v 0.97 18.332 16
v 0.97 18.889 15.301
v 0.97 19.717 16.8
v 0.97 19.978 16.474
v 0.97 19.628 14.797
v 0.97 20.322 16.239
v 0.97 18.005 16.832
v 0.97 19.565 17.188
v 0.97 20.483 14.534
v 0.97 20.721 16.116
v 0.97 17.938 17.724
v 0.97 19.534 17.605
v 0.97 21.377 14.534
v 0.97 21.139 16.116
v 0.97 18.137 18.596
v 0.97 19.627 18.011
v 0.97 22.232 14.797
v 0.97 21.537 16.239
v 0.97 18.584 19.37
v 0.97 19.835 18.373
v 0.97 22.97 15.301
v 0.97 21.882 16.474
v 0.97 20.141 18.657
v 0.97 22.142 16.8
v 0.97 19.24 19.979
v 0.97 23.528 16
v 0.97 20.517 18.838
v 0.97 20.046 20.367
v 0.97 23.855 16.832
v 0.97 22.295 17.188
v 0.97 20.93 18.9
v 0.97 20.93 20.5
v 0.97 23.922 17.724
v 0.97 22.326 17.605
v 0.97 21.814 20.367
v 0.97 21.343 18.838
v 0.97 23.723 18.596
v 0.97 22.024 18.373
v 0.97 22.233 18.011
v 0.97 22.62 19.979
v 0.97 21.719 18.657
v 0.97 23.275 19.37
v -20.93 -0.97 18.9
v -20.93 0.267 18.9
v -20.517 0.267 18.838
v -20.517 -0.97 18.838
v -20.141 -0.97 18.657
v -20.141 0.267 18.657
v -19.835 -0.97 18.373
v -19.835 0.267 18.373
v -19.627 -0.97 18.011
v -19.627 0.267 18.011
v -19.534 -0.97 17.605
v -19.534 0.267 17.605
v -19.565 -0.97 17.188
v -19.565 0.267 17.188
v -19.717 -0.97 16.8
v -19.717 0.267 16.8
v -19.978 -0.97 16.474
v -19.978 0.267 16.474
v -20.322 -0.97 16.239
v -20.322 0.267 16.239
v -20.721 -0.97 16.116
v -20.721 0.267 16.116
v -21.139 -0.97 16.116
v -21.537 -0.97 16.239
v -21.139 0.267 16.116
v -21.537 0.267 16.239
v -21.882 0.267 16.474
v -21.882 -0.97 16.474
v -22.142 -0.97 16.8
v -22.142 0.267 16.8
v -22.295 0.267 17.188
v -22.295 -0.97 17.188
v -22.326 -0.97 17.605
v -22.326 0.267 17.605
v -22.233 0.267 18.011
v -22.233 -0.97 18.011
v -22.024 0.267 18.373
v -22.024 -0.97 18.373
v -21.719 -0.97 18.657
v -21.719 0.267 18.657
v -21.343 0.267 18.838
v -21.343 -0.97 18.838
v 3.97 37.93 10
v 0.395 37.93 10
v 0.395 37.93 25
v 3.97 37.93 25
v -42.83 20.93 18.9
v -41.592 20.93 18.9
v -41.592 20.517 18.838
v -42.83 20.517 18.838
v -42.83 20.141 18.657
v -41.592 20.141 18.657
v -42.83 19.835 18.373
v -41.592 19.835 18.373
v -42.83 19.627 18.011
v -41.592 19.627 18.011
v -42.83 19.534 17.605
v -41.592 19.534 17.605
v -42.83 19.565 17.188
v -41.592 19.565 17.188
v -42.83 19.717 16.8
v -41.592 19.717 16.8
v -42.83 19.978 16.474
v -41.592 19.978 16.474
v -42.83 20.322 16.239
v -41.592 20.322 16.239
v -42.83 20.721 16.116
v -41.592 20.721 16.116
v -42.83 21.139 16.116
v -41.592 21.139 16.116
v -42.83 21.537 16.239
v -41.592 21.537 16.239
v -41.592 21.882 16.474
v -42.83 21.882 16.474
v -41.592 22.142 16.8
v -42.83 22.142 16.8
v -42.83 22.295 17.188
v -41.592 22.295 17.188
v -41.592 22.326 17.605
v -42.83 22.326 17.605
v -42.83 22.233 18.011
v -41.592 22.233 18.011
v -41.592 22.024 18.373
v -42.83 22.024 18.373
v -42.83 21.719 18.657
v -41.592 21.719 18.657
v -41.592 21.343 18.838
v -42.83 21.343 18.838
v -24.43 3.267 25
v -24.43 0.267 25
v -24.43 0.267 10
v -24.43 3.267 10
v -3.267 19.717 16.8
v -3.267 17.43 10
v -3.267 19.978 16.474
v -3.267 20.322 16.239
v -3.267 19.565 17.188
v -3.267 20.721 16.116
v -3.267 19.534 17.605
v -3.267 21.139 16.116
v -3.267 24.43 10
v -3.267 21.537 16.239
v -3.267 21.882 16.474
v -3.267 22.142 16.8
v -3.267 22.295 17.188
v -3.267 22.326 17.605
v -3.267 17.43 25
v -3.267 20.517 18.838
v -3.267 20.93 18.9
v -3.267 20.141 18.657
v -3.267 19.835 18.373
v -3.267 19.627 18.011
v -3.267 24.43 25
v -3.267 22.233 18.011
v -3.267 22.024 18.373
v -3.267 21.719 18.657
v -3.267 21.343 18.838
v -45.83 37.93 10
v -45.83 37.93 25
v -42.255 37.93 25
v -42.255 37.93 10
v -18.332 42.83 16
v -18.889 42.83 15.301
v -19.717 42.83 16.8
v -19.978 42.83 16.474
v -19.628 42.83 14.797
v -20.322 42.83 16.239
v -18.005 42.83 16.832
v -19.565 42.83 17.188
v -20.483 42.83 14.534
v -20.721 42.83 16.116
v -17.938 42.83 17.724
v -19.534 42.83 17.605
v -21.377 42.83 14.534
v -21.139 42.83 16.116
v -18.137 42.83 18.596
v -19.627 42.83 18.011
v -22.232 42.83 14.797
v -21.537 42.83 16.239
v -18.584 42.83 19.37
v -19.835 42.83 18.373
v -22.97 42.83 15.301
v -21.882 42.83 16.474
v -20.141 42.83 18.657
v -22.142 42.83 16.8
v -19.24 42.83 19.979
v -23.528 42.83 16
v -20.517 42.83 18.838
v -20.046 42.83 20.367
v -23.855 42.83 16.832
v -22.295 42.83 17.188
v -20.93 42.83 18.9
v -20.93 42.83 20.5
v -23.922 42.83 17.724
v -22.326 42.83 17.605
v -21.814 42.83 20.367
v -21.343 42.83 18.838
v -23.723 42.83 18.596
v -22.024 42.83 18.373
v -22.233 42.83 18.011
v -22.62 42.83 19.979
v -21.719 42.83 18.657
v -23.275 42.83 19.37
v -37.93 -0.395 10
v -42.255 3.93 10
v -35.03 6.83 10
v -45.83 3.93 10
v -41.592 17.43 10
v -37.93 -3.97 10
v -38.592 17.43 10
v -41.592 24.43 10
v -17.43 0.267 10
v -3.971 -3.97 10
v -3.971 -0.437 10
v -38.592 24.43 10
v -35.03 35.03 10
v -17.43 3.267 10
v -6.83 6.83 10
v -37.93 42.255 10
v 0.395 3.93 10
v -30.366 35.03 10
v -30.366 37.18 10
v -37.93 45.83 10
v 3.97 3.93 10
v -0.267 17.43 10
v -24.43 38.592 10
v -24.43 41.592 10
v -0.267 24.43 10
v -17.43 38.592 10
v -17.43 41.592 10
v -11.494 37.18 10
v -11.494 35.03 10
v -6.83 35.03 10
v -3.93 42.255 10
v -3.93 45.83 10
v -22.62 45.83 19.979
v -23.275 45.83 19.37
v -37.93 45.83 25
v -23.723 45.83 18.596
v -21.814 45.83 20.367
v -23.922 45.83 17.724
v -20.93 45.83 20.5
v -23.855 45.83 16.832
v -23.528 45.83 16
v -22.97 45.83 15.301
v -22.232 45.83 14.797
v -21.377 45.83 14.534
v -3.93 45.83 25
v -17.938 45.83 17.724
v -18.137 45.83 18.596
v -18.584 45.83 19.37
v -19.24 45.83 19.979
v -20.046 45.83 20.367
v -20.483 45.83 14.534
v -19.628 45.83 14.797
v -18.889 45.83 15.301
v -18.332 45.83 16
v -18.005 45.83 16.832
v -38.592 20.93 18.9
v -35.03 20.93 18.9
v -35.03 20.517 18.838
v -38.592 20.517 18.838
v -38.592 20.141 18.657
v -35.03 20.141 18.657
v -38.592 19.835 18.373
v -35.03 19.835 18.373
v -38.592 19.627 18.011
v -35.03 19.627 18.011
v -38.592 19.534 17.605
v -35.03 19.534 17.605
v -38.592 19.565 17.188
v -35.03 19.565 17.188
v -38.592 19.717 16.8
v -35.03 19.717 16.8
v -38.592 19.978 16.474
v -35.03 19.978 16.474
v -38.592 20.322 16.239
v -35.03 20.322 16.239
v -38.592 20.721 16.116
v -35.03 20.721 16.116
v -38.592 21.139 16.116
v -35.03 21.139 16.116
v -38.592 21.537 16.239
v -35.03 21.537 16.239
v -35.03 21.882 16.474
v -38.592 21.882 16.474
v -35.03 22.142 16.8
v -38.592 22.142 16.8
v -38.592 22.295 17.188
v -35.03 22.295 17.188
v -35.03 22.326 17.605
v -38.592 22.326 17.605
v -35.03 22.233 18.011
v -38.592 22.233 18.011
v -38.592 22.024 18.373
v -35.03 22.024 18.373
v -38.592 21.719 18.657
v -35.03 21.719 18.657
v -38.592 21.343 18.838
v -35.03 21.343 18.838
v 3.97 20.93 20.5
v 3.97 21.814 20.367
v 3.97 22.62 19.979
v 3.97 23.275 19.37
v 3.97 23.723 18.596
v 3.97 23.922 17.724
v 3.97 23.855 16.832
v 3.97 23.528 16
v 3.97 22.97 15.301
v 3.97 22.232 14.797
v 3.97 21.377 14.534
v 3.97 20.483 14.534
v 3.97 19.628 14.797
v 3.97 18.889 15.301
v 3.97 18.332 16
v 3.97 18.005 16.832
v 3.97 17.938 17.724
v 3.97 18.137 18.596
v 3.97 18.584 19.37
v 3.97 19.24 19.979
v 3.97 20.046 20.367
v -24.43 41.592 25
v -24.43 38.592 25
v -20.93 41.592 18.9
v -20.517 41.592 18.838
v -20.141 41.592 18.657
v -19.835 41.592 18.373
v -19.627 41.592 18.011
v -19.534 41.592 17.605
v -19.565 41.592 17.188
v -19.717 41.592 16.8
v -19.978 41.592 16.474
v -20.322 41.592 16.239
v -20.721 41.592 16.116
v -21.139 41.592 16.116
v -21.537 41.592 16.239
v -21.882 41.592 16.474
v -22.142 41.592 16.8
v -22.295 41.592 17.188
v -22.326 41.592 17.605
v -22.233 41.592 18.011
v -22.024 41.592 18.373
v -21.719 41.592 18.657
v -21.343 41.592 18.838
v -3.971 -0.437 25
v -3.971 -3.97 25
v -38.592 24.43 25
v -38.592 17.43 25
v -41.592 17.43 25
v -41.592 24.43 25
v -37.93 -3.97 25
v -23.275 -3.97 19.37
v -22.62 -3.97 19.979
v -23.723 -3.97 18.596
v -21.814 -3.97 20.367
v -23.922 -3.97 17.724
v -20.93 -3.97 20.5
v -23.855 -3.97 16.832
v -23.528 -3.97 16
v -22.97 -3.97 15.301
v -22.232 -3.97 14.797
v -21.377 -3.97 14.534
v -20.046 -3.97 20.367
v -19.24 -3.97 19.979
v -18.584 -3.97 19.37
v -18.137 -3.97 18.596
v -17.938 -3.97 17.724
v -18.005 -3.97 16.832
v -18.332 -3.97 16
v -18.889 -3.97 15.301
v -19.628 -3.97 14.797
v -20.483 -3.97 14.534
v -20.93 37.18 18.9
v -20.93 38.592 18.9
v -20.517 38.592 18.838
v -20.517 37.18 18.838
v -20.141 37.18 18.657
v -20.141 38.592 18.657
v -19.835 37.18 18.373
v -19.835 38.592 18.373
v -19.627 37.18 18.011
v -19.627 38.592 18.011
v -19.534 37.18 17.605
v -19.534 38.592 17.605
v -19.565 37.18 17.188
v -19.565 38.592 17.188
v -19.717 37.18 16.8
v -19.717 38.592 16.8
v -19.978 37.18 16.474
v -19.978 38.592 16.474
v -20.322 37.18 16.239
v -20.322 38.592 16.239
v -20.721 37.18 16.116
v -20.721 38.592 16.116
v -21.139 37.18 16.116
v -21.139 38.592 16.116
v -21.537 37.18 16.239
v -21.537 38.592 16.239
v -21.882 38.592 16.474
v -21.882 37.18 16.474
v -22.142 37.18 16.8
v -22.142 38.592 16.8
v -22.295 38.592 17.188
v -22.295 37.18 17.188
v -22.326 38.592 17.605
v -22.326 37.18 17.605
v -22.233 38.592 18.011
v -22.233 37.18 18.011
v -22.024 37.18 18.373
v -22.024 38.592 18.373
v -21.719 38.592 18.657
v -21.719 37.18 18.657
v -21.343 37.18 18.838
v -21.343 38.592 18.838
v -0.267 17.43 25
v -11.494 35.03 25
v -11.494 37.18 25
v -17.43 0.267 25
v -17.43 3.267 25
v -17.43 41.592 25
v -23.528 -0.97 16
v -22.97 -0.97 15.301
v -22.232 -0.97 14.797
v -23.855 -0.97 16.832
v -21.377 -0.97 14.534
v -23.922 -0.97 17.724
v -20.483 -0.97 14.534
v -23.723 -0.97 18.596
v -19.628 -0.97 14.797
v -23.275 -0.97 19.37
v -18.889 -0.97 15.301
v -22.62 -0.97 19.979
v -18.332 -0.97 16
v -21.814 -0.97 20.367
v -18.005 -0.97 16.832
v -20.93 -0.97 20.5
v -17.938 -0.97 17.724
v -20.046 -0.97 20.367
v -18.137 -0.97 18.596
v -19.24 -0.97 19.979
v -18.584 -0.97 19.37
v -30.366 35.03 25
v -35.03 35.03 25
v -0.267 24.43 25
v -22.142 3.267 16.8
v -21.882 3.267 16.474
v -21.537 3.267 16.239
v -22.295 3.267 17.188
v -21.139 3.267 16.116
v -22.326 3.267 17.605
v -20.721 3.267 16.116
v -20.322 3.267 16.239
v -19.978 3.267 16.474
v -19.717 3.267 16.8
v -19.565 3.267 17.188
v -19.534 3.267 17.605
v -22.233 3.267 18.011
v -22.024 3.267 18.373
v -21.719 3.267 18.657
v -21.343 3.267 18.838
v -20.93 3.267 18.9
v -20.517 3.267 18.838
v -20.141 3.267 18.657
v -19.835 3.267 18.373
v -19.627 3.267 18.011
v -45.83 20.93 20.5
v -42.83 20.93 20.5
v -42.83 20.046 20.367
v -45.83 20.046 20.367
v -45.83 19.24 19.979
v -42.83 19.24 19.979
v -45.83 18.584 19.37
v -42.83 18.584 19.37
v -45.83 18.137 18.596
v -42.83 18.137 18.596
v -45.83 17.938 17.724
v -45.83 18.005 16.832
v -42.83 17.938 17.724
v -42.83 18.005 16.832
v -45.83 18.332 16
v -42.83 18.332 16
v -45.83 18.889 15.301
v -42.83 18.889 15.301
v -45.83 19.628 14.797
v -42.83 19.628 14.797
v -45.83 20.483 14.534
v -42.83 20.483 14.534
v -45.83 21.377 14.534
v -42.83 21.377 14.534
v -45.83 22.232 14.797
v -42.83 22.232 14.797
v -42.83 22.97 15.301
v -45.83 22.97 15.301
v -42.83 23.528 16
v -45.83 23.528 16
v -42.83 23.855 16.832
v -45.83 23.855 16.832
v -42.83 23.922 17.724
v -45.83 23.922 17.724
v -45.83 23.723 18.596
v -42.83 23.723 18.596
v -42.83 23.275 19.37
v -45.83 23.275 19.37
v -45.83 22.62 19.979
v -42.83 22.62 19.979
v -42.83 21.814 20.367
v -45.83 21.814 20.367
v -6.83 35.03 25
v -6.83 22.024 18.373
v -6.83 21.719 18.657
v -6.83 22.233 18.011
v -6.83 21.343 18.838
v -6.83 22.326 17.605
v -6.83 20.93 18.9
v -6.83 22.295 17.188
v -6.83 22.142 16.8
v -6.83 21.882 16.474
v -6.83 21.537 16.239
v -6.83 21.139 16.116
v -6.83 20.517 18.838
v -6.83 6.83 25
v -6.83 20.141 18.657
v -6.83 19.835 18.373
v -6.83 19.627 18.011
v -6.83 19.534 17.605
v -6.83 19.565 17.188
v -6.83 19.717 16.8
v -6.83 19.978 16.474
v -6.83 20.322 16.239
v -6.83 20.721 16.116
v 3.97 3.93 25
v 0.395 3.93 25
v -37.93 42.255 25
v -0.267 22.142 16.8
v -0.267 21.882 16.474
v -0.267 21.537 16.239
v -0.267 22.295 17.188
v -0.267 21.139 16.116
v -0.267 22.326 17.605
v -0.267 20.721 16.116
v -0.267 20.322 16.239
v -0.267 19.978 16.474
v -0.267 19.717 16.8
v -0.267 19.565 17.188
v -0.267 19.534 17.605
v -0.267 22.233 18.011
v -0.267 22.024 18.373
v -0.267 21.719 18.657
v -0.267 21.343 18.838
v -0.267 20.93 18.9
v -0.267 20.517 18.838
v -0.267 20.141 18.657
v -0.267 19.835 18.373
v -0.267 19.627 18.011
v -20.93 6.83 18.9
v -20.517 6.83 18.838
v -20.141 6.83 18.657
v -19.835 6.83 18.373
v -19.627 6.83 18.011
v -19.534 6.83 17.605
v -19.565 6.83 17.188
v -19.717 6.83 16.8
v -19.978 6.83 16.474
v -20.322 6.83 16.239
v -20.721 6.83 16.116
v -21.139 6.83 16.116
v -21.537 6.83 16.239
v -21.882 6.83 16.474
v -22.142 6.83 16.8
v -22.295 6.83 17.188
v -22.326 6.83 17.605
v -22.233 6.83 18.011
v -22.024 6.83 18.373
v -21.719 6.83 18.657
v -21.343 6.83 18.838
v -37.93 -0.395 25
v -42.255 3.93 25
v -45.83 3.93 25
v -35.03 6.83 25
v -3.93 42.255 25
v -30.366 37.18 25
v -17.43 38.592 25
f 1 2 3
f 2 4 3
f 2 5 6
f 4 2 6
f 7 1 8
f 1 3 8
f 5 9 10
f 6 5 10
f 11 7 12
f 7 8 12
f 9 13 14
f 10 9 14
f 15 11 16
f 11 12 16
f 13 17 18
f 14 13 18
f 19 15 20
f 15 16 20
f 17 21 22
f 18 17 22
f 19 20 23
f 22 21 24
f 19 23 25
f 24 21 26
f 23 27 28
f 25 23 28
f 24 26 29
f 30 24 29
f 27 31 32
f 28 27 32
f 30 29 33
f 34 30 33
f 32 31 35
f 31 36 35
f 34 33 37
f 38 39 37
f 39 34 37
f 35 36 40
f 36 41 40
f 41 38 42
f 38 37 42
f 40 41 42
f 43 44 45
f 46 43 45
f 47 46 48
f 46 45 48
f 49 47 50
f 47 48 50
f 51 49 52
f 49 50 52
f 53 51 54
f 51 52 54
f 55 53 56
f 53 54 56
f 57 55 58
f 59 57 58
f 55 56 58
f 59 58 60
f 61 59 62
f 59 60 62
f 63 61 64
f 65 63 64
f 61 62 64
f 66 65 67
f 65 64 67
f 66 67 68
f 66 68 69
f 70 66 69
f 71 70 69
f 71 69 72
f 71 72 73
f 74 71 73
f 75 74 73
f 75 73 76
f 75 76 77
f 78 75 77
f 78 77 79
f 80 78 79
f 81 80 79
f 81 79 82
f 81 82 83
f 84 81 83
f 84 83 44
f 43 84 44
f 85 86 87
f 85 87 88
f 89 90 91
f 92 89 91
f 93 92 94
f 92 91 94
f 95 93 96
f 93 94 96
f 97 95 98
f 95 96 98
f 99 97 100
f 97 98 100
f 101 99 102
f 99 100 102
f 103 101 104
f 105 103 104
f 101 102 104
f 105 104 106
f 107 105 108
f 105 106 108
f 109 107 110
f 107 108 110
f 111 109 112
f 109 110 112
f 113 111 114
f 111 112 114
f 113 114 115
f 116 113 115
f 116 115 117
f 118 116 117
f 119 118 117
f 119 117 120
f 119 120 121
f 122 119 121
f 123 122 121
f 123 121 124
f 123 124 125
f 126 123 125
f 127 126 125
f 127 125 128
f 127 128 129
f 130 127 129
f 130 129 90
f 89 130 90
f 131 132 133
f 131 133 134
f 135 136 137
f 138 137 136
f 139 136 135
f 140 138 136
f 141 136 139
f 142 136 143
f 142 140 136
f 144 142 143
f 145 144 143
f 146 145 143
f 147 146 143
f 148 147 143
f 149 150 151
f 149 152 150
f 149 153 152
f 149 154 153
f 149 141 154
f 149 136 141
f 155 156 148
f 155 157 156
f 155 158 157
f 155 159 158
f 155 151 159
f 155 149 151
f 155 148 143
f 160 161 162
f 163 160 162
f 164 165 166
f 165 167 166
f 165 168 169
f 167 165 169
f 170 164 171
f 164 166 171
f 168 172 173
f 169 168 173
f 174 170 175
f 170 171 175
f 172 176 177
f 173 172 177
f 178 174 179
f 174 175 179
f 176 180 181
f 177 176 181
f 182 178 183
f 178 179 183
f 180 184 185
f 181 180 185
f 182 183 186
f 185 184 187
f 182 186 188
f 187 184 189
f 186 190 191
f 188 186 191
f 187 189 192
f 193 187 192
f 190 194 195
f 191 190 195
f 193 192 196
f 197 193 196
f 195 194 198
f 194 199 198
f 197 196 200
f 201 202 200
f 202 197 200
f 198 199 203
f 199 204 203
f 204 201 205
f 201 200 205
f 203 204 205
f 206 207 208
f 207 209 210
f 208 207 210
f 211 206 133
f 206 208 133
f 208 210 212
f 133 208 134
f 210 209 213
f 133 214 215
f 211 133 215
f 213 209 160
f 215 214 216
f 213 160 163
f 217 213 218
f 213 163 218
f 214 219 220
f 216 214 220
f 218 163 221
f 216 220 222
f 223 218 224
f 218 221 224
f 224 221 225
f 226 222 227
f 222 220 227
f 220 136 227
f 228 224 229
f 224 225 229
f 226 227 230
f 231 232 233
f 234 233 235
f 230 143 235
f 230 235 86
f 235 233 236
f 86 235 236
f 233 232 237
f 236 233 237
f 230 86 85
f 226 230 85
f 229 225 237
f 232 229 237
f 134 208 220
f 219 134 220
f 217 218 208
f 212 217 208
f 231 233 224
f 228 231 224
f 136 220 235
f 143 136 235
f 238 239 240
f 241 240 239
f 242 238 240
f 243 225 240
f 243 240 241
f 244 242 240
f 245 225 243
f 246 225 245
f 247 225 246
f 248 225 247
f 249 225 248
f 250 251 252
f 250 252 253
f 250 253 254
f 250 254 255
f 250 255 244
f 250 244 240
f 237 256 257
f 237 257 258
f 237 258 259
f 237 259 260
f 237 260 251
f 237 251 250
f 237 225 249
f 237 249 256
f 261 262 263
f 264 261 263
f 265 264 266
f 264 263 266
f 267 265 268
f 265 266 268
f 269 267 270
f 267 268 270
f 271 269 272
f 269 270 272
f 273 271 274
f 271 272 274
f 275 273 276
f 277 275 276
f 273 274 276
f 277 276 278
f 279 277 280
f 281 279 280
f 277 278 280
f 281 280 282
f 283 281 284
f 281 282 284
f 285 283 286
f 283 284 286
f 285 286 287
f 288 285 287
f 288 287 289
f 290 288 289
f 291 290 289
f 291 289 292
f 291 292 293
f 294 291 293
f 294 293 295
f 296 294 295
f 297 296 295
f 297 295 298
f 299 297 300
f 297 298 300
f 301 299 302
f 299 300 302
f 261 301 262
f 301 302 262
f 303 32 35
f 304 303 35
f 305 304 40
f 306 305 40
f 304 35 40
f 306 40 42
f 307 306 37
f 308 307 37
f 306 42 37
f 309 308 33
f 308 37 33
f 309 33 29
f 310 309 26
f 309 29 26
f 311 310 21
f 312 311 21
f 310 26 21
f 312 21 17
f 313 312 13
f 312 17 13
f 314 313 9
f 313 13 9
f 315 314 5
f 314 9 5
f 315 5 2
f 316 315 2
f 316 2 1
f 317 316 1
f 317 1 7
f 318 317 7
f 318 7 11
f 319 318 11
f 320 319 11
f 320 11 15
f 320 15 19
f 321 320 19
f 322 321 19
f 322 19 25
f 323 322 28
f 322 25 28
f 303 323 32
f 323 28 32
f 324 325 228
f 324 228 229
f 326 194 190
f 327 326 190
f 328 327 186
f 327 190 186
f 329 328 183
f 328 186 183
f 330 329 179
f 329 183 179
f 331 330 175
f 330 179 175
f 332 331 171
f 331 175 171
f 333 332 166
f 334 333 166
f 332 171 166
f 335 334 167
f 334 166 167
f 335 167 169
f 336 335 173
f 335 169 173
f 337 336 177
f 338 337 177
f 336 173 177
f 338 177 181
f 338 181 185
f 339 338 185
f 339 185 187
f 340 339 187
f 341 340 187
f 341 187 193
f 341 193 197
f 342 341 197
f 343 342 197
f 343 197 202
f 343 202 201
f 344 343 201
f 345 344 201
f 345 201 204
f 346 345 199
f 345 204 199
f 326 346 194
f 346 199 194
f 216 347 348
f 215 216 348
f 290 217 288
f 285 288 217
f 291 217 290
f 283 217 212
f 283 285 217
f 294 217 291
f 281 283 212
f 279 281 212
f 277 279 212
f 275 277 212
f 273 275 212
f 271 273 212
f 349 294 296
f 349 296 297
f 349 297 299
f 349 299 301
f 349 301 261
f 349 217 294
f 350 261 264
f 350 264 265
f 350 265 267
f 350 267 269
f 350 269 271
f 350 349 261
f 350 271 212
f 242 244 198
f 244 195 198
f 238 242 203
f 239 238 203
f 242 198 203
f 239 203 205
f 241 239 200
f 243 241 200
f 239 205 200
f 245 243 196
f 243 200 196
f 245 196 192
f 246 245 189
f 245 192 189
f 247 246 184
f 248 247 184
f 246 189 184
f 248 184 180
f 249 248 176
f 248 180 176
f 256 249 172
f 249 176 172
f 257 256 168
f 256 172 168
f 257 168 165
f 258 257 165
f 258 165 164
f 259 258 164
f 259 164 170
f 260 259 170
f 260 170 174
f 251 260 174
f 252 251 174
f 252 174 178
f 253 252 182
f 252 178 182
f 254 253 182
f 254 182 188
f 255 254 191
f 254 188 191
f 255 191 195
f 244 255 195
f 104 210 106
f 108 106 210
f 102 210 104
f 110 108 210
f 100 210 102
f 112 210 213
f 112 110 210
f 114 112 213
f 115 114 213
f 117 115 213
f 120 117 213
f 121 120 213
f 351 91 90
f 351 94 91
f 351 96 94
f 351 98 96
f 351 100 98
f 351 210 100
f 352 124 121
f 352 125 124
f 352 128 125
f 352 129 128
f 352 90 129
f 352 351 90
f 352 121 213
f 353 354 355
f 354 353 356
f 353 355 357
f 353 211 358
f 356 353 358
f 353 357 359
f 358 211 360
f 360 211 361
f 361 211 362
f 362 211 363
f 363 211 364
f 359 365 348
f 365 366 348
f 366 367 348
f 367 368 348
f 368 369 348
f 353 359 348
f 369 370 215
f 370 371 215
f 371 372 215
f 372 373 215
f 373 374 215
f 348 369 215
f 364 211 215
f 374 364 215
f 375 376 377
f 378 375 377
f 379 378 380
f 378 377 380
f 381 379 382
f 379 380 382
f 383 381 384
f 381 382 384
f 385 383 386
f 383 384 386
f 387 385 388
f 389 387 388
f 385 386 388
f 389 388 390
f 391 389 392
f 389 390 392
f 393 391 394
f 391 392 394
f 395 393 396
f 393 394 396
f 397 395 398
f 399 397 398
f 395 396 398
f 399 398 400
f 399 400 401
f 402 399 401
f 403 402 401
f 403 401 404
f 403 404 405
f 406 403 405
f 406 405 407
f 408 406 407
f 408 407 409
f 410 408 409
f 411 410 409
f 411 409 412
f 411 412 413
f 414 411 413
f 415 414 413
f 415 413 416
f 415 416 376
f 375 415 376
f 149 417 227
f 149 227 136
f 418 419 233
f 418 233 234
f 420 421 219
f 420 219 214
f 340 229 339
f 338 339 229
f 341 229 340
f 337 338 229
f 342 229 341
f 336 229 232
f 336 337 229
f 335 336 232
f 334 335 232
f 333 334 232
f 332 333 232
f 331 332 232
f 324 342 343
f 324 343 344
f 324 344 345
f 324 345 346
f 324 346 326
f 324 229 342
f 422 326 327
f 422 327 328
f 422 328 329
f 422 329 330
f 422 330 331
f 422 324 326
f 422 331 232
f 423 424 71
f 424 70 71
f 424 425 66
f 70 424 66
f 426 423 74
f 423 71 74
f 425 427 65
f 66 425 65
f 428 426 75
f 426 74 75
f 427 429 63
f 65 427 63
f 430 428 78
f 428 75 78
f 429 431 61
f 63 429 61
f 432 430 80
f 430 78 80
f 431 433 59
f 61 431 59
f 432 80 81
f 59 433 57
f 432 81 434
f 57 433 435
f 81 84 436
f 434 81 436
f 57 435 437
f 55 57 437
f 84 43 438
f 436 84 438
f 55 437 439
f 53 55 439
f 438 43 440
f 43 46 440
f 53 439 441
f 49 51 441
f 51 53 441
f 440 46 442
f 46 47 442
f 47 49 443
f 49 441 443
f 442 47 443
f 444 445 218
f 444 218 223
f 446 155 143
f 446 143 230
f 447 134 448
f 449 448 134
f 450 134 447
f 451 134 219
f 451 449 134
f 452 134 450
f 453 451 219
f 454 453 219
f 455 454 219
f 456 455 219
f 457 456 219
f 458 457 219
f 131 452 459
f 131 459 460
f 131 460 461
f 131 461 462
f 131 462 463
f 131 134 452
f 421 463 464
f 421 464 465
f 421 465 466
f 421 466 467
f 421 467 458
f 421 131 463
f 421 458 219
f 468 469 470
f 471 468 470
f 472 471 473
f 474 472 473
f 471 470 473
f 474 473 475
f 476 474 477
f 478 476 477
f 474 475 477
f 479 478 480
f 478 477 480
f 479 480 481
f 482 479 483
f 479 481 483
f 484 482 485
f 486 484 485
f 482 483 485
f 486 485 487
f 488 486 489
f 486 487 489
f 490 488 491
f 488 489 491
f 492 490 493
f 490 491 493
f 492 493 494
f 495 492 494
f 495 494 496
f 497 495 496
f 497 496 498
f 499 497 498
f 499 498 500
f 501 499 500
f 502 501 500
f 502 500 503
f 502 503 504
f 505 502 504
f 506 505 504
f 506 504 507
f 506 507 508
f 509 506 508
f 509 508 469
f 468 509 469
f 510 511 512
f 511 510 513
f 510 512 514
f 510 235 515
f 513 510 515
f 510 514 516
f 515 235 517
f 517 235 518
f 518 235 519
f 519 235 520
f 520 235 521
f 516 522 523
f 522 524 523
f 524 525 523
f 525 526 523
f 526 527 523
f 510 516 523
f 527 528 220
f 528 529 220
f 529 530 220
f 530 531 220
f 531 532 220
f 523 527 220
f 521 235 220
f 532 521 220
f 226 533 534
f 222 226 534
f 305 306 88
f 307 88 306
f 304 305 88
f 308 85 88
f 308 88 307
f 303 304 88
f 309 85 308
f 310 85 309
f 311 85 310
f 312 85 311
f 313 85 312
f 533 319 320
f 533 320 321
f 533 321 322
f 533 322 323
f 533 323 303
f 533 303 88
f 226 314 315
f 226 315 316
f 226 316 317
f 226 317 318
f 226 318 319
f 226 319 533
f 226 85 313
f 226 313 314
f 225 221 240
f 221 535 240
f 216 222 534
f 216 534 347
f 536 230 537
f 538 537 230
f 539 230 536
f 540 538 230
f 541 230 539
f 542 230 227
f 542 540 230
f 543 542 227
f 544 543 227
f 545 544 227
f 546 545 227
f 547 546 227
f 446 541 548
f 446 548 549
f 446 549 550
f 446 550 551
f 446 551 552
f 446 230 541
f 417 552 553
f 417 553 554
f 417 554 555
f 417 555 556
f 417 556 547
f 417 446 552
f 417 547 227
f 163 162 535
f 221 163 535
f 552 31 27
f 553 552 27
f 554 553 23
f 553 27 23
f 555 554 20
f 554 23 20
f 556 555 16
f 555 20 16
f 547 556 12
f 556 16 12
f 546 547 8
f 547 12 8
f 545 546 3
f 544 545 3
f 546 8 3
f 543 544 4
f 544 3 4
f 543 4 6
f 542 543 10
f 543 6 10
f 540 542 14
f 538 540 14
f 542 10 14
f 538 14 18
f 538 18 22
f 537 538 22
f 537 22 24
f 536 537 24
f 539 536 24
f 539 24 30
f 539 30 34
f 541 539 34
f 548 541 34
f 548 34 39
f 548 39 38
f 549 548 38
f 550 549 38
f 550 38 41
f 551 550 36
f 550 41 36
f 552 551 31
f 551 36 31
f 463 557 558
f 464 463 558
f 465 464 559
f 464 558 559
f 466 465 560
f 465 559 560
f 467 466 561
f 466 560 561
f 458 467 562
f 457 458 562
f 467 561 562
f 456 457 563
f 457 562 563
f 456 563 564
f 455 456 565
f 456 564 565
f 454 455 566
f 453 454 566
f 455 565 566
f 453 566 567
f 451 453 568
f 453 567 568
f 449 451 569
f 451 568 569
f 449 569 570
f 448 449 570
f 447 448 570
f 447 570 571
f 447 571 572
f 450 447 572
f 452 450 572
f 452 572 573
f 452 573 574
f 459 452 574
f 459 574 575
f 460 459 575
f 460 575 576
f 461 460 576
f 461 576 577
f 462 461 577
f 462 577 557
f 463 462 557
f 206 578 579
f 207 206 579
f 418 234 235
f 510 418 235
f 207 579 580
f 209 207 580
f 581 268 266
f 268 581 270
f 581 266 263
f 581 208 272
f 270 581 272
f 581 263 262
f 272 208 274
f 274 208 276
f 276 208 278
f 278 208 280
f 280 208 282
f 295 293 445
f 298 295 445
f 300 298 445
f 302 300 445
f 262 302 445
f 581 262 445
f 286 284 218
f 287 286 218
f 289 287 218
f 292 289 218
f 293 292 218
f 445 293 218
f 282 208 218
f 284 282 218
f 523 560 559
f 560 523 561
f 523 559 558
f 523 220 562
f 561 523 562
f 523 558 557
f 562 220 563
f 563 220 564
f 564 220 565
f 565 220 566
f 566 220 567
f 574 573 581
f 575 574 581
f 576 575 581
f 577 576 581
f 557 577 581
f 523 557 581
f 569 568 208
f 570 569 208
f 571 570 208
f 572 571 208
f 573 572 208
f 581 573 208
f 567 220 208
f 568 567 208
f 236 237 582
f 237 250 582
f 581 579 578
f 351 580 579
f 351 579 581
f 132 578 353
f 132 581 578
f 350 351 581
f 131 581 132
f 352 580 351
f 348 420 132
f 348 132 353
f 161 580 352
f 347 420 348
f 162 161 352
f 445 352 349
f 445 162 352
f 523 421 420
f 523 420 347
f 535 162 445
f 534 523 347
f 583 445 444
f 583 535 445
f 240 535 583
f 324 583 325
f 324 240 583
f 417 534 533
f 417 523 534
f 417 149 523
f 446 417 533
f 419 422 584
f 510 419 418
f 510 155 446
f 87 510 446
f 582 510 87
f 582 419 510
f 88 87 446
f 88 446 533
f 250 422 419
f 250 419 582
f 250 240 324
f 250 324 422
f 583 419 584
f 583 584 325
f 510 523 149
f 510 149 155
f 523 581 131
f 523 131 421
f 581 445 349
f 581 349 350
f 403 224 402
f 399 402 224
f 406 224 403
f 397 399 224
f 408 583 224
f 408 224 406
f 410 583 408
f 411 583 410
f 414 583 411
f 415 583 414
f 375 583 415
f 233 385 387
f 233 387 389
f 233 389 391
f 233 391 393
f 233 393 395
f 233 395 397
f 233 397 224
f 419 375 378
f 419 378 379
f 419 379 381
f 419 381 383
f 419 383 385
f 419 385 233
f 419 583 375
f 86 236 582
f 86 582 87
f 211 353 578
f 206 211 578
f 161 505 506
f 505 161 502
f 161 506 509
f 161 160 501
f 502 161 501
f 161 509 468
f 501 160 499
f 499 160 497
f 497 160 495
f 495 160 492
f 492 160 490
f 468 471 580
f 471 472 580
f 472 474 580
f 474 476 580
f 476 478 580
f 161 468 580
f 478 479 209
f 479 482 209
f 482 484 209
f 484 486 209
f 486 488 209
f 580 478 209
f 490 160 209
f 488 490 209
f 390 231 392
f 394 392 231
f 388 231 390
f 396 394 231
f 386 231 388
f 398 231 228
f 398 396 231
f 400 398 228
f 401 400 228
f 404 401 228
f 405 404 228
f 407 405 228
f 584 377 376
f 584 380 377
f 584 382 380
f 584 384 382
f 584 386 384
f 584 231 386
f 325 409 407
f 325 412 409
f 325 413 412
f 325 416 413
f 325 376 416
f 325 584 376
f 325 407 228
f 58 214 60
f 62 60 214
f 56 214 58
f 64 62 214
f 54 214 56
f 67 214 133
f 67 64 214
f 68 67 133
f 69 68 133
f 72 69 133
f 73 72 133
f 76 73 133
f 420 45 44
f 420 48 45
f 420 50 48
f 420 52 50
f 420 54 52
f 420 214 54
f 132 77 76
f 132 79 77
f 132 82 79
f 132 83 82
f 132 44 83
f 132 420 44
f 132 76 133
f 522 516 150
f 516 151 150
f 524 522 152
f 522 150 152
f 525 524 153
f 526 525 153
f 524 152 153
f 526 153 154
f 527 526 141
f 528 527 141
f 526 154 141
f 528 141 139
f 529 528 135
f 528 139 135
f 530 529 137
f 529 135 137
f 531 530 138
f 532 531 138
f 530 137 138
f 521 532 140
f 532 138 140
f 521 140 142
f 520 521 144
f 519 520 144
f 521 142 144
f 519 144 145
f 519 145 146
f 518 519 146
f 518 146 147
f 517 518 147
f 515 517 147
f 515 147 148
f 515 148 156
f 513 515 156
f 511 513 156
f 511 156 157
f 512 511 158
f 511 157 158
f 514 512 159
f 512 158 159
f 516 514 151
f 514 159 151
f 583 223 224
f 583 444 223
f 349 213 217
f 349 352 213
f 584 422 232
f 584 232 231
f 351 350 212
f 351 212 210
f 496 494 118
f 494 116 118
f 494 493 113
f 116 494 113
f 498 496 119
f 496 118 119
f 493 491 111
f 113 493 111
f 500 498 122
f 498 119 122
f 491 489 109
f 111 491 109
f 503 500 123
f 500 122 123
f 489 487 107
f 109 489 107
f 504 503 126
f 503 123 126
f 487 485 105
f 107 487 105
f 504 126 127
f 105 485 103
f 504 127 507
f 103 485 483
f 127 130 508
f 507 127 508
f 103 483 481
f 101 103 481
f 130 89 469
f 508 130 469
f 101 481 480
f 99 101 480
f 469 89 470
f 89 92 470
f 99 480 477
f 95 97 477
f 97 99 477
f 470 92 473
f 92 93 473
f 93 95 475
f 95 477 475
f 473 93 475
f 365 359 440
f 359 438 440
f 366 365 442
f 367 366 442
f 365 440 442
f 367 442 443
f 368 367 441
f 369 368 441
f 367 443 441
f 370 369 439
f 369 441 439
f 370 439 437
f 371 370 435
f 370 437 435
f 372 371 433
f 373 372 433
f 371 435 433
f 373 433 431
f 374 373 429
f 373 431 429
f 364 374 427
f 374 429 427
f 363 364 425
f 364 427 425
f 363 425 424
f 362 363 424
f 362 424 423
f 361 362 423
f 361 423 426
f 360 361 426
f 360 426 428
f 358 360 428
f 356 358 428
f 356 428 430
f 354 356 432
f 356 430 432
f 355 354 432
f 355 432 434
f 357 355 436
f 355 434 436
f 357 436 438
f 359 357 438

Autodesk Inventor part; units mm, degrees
ref_plane "YZ Plane" through (0, 0, 0) normal (1, 0, 0) x (0, 1, 0)
ref_plane "XZ Plane" through (0, 0, 0) normal (0, 1, 0) x (-1, 0, 0)
ref_plane "XY Plane" through (0, 0, 0) normal (0, 0, 1) x (1, 0, 0)
ref_plane "Work Plane5" through (0, 0, 10) normal (0, 0, 1) x (1, 0, 0)
sketch "Sketch1" plane through (0, 0, 10) normal (0, 0, 1) x (1, 0, 0)
  line L0 (-4.0299, -0.3538) -> (-2.2322, 1.4439) construction
  arc A0 (-1.4439, 2.2322) -> (-2.2322, 1.4439) centre (-0.9299, 0.9299) ccw construction
  line L1 (-1.4439, 2.2322) -> (0.3538, 4.0299) construction
  line L2 (-37.8299, 42.8299) -> (-37.8299, 37.8299) construction
  line L3 (-37.8299, 37.8299) -> (-42.9208, 37.8299) construction
  line L4 (-37.8299, 42.2137) -> (-37.8299, 45.8299) construction
  line L5 (-37.8299, 45.8299) -> (-4.0299, 45.8299) construction
  line L6 (-4.0299, 45.8299) -> (-4.0299, 42.2137) construction
  line L7 (-4.0299, 4.0299) -> (0.3538, 4.0299) projected
  circle A1 centre (-20.9299, 20.9299) radius 17.5 projected
  line L8 (-20.9299, 58.9723) -> (17.1124, 20.9299) construction
  line L9 (17.1124, 20.9299) -> (-20.9299, -17.1124) construction
  line L10 (-20.9299, -17.1124) -> (-58.9723, 20.9299) construction
  line L11 (-58.9723, 20.9299) -> (-20.9299, 58.9723) construction
  line L12 (-20.9299, 58.9723) -> (-20.9299, -17.1124) construction
  line L13 (17.1124, 20.9299) -> (-58.9723, 20.9299) construction
  line L14 (-20.9299, 58.9723) -> (32.8701, 58.9723) construction
  line L15 (-43.4299, 43.4299) -> (1.5701, 43.4299) construction
  line L16 (1.5701, 43.4299) -> (1.5701, -1.5701) construction
  line L17 (1.5701, -1.5701) -> (-43.4299, -1.5701) construction
  line L18 (-43.4299, -1.5701) -> (-43.4299, 43.4299) construction
  line L19 (-43.4299, 43.4299) -> (1.5701, -1.5701) construction
  line L20 (1.5701, 43.4299) -> (-43.4299, -1.5701) construction
  line L21 (-43.4299, 5.3876) -> (-43.4299, 36.4723)
  line L22 (-43.4299, 36.4723) -> (-36.4723, 43.4299)
  line L23 (-36.4723, 43.4299) -> (-5.3876, 43.4299)
  line L24 (-5.3876, 43.4299) -> (1.5701, 36.4723)
  line L25 (1.5701, 36.4723) -> (1.5701, 5.3876)
  line L26 (1.5701, 5.3876) -> (-5.3876, -1.5701)
  line L27 (-5.3876, -1.5701) -> (-36.4723, -1.5701)
  line L28 (-36.4723, -1.5701) -> (-43.4299, 5.3876)
  line L29 (-4.0299, 42.2137) -> (-37.8299, 42.2137) projected
  line L30 (-4.0299, -0.3538) -> (-4.0299, 4.0299) projected
  circle A2 centre (-20.9299, 20.9299) radius 1.5
  line L31 (-10.9299, 10.9299) -> (-30.9299, 10.9299) construction
  line L32 (-30.9299, 10.9299) -> (-30.9299, 30.9299) construction
  line L33 (-30.9299, 30.9299) -> (-10.9299, 30.9299) construction
  line L34 (-10.9299, 30.9299) -> (-10.9299, 10.9299) construction
  line L35 (-10.9299, 10.9299) -> (-30.9299, 30.9299) construction
  line L36 (-30.9299, 10.9299) -> (-10.9299, 30.9299) construction
  circle A3 centre (-30.9299, 30.9299) radius 1.4
  circle A4 centre (-30.9299, 10.9299) radius 1.4
  circle A5 centre (-10.9299, 10.9299) radius 1.4
  line L37 (-45.8299, 37.8299) -> (-42.0723, 37.8299) construction
  line L38 (-42.1723, 37.7299) -> (-45.8299, 37.7299)
  line L39 (-45.8299, 37.7299) -> (-45.8299, 4.1299)
  line L40 (-45.8299, 4.1299) -> (-42.1723, 4.1299)
  line L41 (-42.1723, 4.1299) -> (-42.1723, 37.7299)
  line L42 (-45.8299, 4.0299) -> (-42.0723, 4.0299) construction
  line L43 (-45.8299, 37.8299) -> (-42.0723, 37.8299) projected
  line L44 (-37.7299, 45.8299) -> (-4.1299, 45.8299)
  line L45 (-4.1299, 45.8299) -> (-4.1299, 42.1723)
  line L46 (-4.1299, 42.1723) -> (-37.7299, 42.1723)
  line L47 (-37.7299, 42.1723) -> (-37.7299, 45.8299)
  line L48 (0.4701, 37.8299) -> (0.4701, 4.0299) construction
  line L49 (0.4701, 4.0299) -> (3.9701, 4.0299) construction
  line L50 (3.9701, 37.8299) -> (3.9701, 4.0299) construction
  line L51 (0.4701, 37.8299) -> (3.9701, 37.8299) construction
  line L52 (-45.8299, -3.9701) -> (-4.0299, -3.9701) construction
  line L53 (0.3124, 37.7299) -> (3.9701, 37.7299)
  line L54 (3.9701, 37.7299) -> (3.9701, 4.1299)
  line L55 (3.9701, 4.1299) -> (0.3124, 4.1299)
  line L56 (0.3124, 4.1299) -> (0.3124, 37.7299)
  line L57 (-4.1713, -0.3538) -> (-37.7299, -0.3538)
  line L58 (-37.7299, -0.3538) -> (-37.7299, -3.9701)
  line L59 (-37.7299, -3.9701) -> (-4.1713, -3.9701)
  line L60 (-4.1713, -3.9701) -> (-4.1713, -0.3538)
  point P0 (-37.8299, 4.0299)
  dimension "d18" = 53.8
  dimension "d19" = 45
  dimension "d20" = 53.8
  dimension "d21" = 45
  dimension "d22" = 45
  dimension "d30" = 20
  dimension "d31" = 20
  dimension "d32" = 2.8
  dimension "d33" = 2.8
  dimension "d34" = 2.8
  dimension "d35" = 3
  dimension "d36" = 0.1
  dimension "d37" = 0.1
  dimension "d38" = 0.1
  dimension "d39" = 0.1
extrude "Extrusion1" add sketch "Sketch1" along normal blind 15 contours L30 L26 L57 L28 L41 L22 L46 L24 L56 L7 | L7 L26 L30 | L56 L24 L25 L26 | L26 L25 L24 L53 L54 L55 | L60 L59 L58 L57 L28 L27 L26 | L26 L27 L28 L57 | L46 L22 L29 L24 | L24 L29 L45 | L40 L39 L38 L22 L21 L28 | L28 L21 L22 L41 | L29 L22 L23 L24 | L24 L23 L22 L29 L47 L44 L45 | L47 L29 L22 | A1 | A2 | A3 | A4 | A5
sketch "Skizze4" plane through (0, 0, 25) normal (0, 0, 1) x (1, 0, 0)
  line L0 (-37.7299, 42.1723) -> (-42.1723, 37.7299) projected
  line L1 (-42.1723, 37.7299) -> (-45.8299, 37.7299) projected
  line L2 (-45.8299, 37.7299) -> (-45.8299, 4.1299) construction
  line L3 (-45.8299, 4.1299) -> (-42.1723, 4.1299) projected
  line L4 (-42.1723, 4.1299) -> (-37.6885, -0.3538) projected
  line L5 (-37.6885, -0.3538) -> (-37.7299, -0.3538) projected
  line L6 (-37.7299, -0.3538) -> (-37.7299, -3.9701) projected
  line L7 (-37.7299, -3.9701) -> (-4.1713, -3.9701) construction
  line L8 (-4.1713, -3.9701) -> (-4.1713, -0.3538) projected
  line L9 (-4.1713, -0.3538) -> (0.3124, 4.1299) projected
  line L10 (0.3124, 4.1299) -> (3.9701, 4.1299) projected
  line L11 (3.9701, 4.1299) -> (3.9701, 37.7299) construction
  line L12 (3.9701, 37.7299) -> (0.3124, 37.7299) projected
  line L13 (0.3124, 37.7299) -> (-4.1299, 42.1723) projected
  line L14 (-4.1299, 42.1723) -> (-4.1299, 45.8299) projected
  line L15 (-4.1299, 45.8299) -> (-37.7299, 45.8299) construction
  line L16 (-37.7299, 45.8299) -> (-37.7299, 42.1723) projected
  line L17 (-37.9299, 46.0299) -> (-3.9299, 46.0299) construction
  line L18 (-3.9299, 46.0299) -> (-3.9299, 42.2551)
  line L19 (-3.9299, 42.2551) -> (0.3953, 37.9299)
  line L20 (0.3953, 37.9299) -> (4.1701, 37.9299)
  line L21 (4.1701, 37.9299) -> (4.1701, 3.9299) construction
  line L22 (4.1701, 3.9299) -> (0.3953, 3.9299)
  line L23 (0.3953, 3.9299) -> (-3.9713, -0.4367)
  line L24 (-3.9713, -0.4367) -> (-3.9713, -4.1701)
  line L25 (-3.9713, -4.1701) -> (-37.9299, -4.1701) construction
  line L26 (-37.9299, -4.1701) -> (-37.9299, -0.3953)
  line L27 (-37.9299, -0.3953) -> (-42.2551, 3.9299)
  line L28 (-42.2551, 3.9299) -> (-46.0299, 3.9299)
  line L29 (-46.0299, 3.9299) -> (-46.0299, 37.9299) construction
  line L30 (-46.0299, 37.9299) -> (-42.2551, 37.9299)
  line L31 (-42.2551, 37.9299) -> (-37.9299, 42.2551)
  line L32 (-37.9299, 42.2551) -> (-37.9299, 46.0299)
  line L33 (-45.8299, 37.7299) -> (-45.8299, 37.9299)
  line L34 (-4.1299, 45.8299) -> (-37.7299, 45.8299) projected
  line L35 (-37.7299, 45.8299) -> (-37.9299, 45.8299)
  line L36 (-4.1299, 45.8299) -> (-3.9299, 45.8299)
  line L37 (3.9701, 37.7299) -> (3.9701, 37.9299)
  line L38 (3.9701, 4.1299) -> (3.9701, 37.7299) projected
  line L39 (3.9701, 4.1299) -> (3.9701, 3.9299)
  line L40 (-4.1713, -3.9701) -> (-3.9713, -3.9701)
  line L41 (-37.7299, -3.9701) -> (-37.9299, -3.9701)
  line L42 (-45.8299, 4.1299) -> (-45.8299, 3.9299)
  point P0 (0, 0)
  dimension "d40" = 0.2
extrude "IM_offset" add sketch "Skizze4" against normal up to surface (15 mm away)
sketch "Sketch29" plane through (0, 0, 10) normal (0, 0, -1) x (-1, 0, 0)
  line L0 (30.9299, 15.9299) -> (30.9299, 25.9299)
  line L1 (25.9299, 30.9299) -> (15.8299, 30.9299)
  line L2 (10.9299, 29.4299) -> (10.9299, 12.4299)
  line L3 (29.4299, 10.9299) -> (12.4299, 10.9299)
  line L4 (10.9299, 10.9299) -> (30.9299, 10.9299) construction
  line L5 (30.9299, 10.9299) -> (30.9299, 30.9299)
  line L6 (30.9299, 30.9299) -> (10.9299, 30.9299)
  line L7 (10.9299, 30.9299) -> (10.9299, 10.9299)
  line L8 (10.8299, 10.8299) -> (31.0299, 10.8299)
  line L9 (31.0299, 10.8299) -> (31.0299, 31.0299)
  line L10 (31.0299, 31.0299) -> (10.8299, 31.0299)
  line L11 (10.8299, 31.0299) -> (10.8299, 10.8299)
  circle A0 centre (20.9299, 20.9299) radius 11
  line L12 (13.0299, 34.4299) -> (28.8299, 34.4299)
  line L13 (6.9299, 12.5299) -> (6.9299, 29.3299)
  line L14 (34.9299, 9.4299) -> (34.9299, 32.4299)
  line L15 (29.3299, 6.9299) -> (12.5299, 6.9299)
  line L16 (12.5299, 34.9299) -> (29.3299, 34.9299)
  line L17 (34.9299, 6.9299) -> (6.9299, 6.9299)
  line L18 (6.9299, 6.9299) -> (6.9299, 34.9299)
  line L19 (6.9299, 34.9299) -> (34.9299, 34.9299)
  line L20 (34.9299, 34.9299) -> (34.9299, 6.9299)
  line L21 (34.9299, 6.9299) -> (6.9299, 34.9299) construction
  line L22 (6.9299, 6.9299) -> (34.9299, 34.9299) construction
  line L23 (35.0299, 35.0299) -> (6.8299, 35.0299)
  line L24 (6.8299, 35.0299) -> (6.8299, 6.8299)
  line L25 (6.8299, 6.8299) -> (35.0299, 6.8299)
  line L26 (35.0299, 6.8299) -> (35.0299, 35.0299)
  point P0 (0, 0)
  dimension "d188" = 0.1
  dimension "d189" = 0.1
extrude "Extrusion23" cut sketch "Sketch29" against normal through all contours A0 L3 L2 L1 L0 | A0 L9 L8 | L0 A0 L9 | A0 L1 L6 L5 L0 | L0 L5 L6 L1 A0 L10 L9 | A0 L8 L3 | L9 A0 | L1 A0 L10 | A0 L8 L11 | A0 L8 | A0 L2 L7 L6 L1 | L1 L6 L7 L2 A0 L11 L10 | L10 A0 | A0 L11 L2 | A0 L11 | L13 L18 L19 L16 L20 L14 L17 L15 | L26 L25 L24 L23
sketch "Sketch30" plane through (-45.8299, 0, 10) normal (-1, 0, 0) x (0, 0, 1)
  line L0 (35.0799, 45.8299) -> (6.8799, 45.8299)
  line L1 (0, 3.9299) -> (0, 37.9299) projected
  line L2 (15, 3.9299) -> (0, 3.9299) projected
  line L3 (15, 37.9299) -> (15, 3.9299) projected
  line L4 (15, 37.9299) -> (0, 37.9299) projected
  circle A0 centre (7.5, 20.9299) radius 1.7201
  point P0 (-10, 0)
ref_plane "Arbeitsebene7" through (-20.9299, 3.9299, 10) normal (-1, 0, 0) x (0, 0, 1)
ref_plane "Arbeitsebene8" through (-37.9299, 20.9299, 10) normal (0, 1, 0) x (1, 0, 0)
ref_plane "Arbeitsebene9" through (-20.9299, 3.9299, 10) normal (-1, 0, 0) x (0, 0, 1)
ref_plane "Arbeitsebene10" through (-37.9299, 20.9299, 10) normal (0, -1, 0) x (1, 0, 0)
hole "Bohrung2" at (-45.8299, 20.9299, 17.5) direction (1, 0, 0) diameter 2.8 end through all counterbore diameter 6 counterbore depth 3
pattern_circular "Runde Anordnung2" count 4 over 360 about axis through (-20.9299, 20.9299, 10) along (0, 0, 1) of "Bohrung2"
ref_plane "Arbeitsebene11" through (-20.9299, 3.9299, 10) normal (1, 0, 0) x (0, 0, -1)
ref_plane "Arbeitsebene12" through (-37.9299, 20.9299, 10) normal (0, 1, 0) x (1, 0, 0)
sketch "Sketch31" plane through (0, 0, 25) normal (0, 0, 1) x (1, 0, 0)
  point P0 (0, 0)
sketch "Sketch32" plane through (0, 0, 25) normal (0, 0, 1) x (1, 0, 0)
  line L0 (-6.8299, 6.8299) -> (-35.0299, 6.8299) projected
  line L1 (-35.0299, 6.8299) -> (-35.0299, 35.0299) projected
  line L2 (-35.0299, 35.0299) -> (-6.8299, 35.0299) projected
  line L3 (-6.8299, 35.0299) -> (-6.8299, 6.8299) projected
  line L4 (3.9701, 3.9299) -> (3.9701, 37.9299) projected
  line L5 (3.9701, 37.9299) -> (0.3953, 37.9299) projected
  line L6 (0.3953, 37.9299) -> (-3.9299, 42.2551) projected
  line L7 (-3.9299, 42.2551) -> (-3.9299, 45.8299) projected
  line L8 (-3.9299, 45.8299) -> (-37.9299, 45.8299) projected
  line L9 (-37.9299, 45.8299) -> (-37.9299, 42.2551) projected
  line L10 (-37.9299, 42.2551) -> (-42.2551, 37.9299) projected
  line L11 (-42.2551, 37.9299) -> (-45.8299, 37.9299) projected
  line L12 (-45.8299, 37.9299) -> (-45.8299, 3.9299) projected
  line L13 (-42.2551, 3.9299) -> (-45.8299, 3.9299) projected
  line L14 (-37.9299, -0.3953) -> (-42.2551, 3.9299) projected
  line L15 (-37.9299, -3.9701) -> (-37.9299, -0.3953) projected
  line L16 (-3.9713, -3.9701) -> (-37.9299, -3.9701) projected
  line L17 (-3.9713, -3.9701) -> (-3.9713, -0.4367) projected
  line L18 (-3.9713, -0.4367) -> (0.3953, 3.9299) projected
  line L19 (0.3953, 3.9299) -> (3.9701, 3.9299) projected
  line L20 (-22.3299, 42.8299) -> (-22.3299, 35.0299) projected
  line L21 (-19.5299, 42.8299) -> (-19.5299, 35.0299) projected
  line L22 (0.9701, 22.3299) -> (-6.8299, 22.3299) projected
  line L23 (0.9701, 19.5299) -> (-6.8299, 19.5299) projected
  line L24 (-19.5299, 6.8299) -> (-19.5299, -0.9701) projected
  line L25 (-22.3299, 6.8299) -> (-22.3299, -0.9701) projected
  line L26 (-35.0299, 19.5299) -> (-42.8299, 19.5299) projected
  line L27 (-35.0299, 22.3299) -> (-42.8299, 22.3299) projected
  line L28 (-41.5925, 24.4299) -> (-38.5925, 24.4299)
  line L29 (-38.5925, 24.4299) -> (-38.5925, 17.4299)
  line L30 (-38.5925, 17.4299) -> (-41.5925, 17.4299)
  line L31 (-41.5925, 17.4299) -> (-41.5925, 24.4299)
  line L32 (-41.5925, 24.4299) -> (-38.5925, 17.4299) construction
  line L33 (-38.5925, 24.4299) -> (-41.5925, 17.4299) construction
  point P0 (0, 0)
  point P1 (-40.0925, 20.9299)
  dimension "d190" = 3
  dimension "d191" = 7
extrude "Extrusion25" cut sketch "Sketch32" against normal through all contours L29 L30 L31 L26 | L26 L31 L27 L29 | L27 L31 L28 L29
pattern_circular "Circular Pattern3" count 4 over 360 about axis through (-20.9299, 20.9299, 10) along (0, 0, 1) of "Extrusion25"
sketch "Sketch33" plane through (0, 0, 25) normal (0, 0, 1) x (1, 0, 0)
  line L0 (-24.4299, 38.5925) -> (-24.4299, 41.5925) projected
  line L1 (-24.4299, 41.5925) -> (-17.4299, 41.5925) projected
  line L2 (-17.4299, 41.5925) -> (-17.4299, 38.5925) projected
  line L3 (-17.4299, 38.5925) -> (-24.4299, 38.5925) projected
  line L4 (-3.2673, 24.4299) -> (-0.2673, 24.4299) projected
  line L5 (-0.2673, 24.4299) -> (-0.2673, 17.4299) projected
  line L6 (-0.2673, 17.4299) -> (-3.2673, 17.4299) projected
  line L7 (-3.2673, 17.4299) -> (-3.2673, 24.4299) projected
  line L8 (-17.4299, 3.2673) -> (-17.4299, 0.2673) projected
  line L9 (-17.4299, 0.2673) -> (-24.4299, 0.2673) projected
  line L10 (-24.4299, 0.2673) -> (-24.4299, 3.2673) projected
  line L11 (-24.4299, 3.2673) -> (-17.4299, 3.2673) projected
  line L12 (-41.5925, 24.4299) -> (-38.5925, 24.4299) projected
  line L13 (-38.5925, 24.4299) -> (-38.5925, 17.4299) projected
  line L14 (-38.5925, 17.4299) -> (-41.5925, 17.4299) projected
  line L15 (-41.5925, 17.4299) -> (-41.5925, 24.4299) projected
  line L16 (-6.8299, 6.8299) -> (-35.0299, 6.8299) projected
  line L17 (-35.0299, 6.8299) -> (-35.0299, 35.0299) projected
  line L18 (-35.0299, 35.0299) -> (-6.8299, 35.0299) projected
  line L19 (-6.8299, 35.0299) -> (-6.8299, 6.8299) projected
  line L20 (3.9701, 3.9299) -> (3.9701, 37.9299) projected
  line L21 (3.9701, 37.9299) -> (0.3953, 37.9299) projected
  line L22 (0.3953, 37.9299) -> (-3.9299, 42.2551) projected
  line L23 (-3.9299, 42.2551) -> (-3.9299, 45.8299) projected
  line L24 (-3.9299, 45.8299) -> (-37.9299, 45.8299) projected
  line L25 (-37.9299, 45.8299) -> (-37.9299, 42.2551) projected
  line L26 (-37.9299, 42.2551) -> (-42.2551, 37.9299) projected
  line L27 (-42.2551, 37.9299) -> (-45.8299, 37.9299) projected
  line L28 (-45.8299, 37.9299) -> (-45.8299, 3.9299) projected
  line L29 (-42.2551, 3.9299) -> (-45.8299, 3.9299) projected
  line L30 (-37.9299, -0.3953) -> (-42.2551, 3.9299) projected
  line L31 (-37.9299, -3.9701) -> (-37.9299, -0.3953) projected
  line L32 (-3.9713, -3.9701) -> (-37.9299, -3.9701) projected
  line L33 (-3.9713, -3.9701) -> (-3.9713, -0.4367) projected
  line L34 (-3.9713, -0.4367) -> (0.3953, 3.9299) projected
  line L35 (0.3953, 3.9299) -> (3.9701, 3.9299) projected
  line L36 (-11.4941, 32.8797) -> (-30.3658, 32.8797)
  line L37 (-30.3658, 32.8797) -> (-30.3658, 37.1801)
  line L38 (-30.3658, 37.1801) -> (-11.4941, 37.1801)
  line L39 (-11.4941, 37.1801) -> (-11.4941, 32.8797)
  line L40 (-6.8299, 35.0299) -> (-35.0299, 35.0299) projected
  line L41 (-11.4941, 32.8797) -> (-30.3658, 37.1801) construction
  line L42 (-30.3658, 32.8797) -> (-11.4941, 37.1801) construction
  point P0 (0, 0)
  point P1 (-20.9299, 35.0299)
extrude "Extrusion26" cut sketch "Sketch33" against normal through all contours L39 L36 L37 L18 | L18 L37 L38 L39
properties part number "30_Cube_Z_Focus_MGN_NEMA_Motorsupport_centered"
